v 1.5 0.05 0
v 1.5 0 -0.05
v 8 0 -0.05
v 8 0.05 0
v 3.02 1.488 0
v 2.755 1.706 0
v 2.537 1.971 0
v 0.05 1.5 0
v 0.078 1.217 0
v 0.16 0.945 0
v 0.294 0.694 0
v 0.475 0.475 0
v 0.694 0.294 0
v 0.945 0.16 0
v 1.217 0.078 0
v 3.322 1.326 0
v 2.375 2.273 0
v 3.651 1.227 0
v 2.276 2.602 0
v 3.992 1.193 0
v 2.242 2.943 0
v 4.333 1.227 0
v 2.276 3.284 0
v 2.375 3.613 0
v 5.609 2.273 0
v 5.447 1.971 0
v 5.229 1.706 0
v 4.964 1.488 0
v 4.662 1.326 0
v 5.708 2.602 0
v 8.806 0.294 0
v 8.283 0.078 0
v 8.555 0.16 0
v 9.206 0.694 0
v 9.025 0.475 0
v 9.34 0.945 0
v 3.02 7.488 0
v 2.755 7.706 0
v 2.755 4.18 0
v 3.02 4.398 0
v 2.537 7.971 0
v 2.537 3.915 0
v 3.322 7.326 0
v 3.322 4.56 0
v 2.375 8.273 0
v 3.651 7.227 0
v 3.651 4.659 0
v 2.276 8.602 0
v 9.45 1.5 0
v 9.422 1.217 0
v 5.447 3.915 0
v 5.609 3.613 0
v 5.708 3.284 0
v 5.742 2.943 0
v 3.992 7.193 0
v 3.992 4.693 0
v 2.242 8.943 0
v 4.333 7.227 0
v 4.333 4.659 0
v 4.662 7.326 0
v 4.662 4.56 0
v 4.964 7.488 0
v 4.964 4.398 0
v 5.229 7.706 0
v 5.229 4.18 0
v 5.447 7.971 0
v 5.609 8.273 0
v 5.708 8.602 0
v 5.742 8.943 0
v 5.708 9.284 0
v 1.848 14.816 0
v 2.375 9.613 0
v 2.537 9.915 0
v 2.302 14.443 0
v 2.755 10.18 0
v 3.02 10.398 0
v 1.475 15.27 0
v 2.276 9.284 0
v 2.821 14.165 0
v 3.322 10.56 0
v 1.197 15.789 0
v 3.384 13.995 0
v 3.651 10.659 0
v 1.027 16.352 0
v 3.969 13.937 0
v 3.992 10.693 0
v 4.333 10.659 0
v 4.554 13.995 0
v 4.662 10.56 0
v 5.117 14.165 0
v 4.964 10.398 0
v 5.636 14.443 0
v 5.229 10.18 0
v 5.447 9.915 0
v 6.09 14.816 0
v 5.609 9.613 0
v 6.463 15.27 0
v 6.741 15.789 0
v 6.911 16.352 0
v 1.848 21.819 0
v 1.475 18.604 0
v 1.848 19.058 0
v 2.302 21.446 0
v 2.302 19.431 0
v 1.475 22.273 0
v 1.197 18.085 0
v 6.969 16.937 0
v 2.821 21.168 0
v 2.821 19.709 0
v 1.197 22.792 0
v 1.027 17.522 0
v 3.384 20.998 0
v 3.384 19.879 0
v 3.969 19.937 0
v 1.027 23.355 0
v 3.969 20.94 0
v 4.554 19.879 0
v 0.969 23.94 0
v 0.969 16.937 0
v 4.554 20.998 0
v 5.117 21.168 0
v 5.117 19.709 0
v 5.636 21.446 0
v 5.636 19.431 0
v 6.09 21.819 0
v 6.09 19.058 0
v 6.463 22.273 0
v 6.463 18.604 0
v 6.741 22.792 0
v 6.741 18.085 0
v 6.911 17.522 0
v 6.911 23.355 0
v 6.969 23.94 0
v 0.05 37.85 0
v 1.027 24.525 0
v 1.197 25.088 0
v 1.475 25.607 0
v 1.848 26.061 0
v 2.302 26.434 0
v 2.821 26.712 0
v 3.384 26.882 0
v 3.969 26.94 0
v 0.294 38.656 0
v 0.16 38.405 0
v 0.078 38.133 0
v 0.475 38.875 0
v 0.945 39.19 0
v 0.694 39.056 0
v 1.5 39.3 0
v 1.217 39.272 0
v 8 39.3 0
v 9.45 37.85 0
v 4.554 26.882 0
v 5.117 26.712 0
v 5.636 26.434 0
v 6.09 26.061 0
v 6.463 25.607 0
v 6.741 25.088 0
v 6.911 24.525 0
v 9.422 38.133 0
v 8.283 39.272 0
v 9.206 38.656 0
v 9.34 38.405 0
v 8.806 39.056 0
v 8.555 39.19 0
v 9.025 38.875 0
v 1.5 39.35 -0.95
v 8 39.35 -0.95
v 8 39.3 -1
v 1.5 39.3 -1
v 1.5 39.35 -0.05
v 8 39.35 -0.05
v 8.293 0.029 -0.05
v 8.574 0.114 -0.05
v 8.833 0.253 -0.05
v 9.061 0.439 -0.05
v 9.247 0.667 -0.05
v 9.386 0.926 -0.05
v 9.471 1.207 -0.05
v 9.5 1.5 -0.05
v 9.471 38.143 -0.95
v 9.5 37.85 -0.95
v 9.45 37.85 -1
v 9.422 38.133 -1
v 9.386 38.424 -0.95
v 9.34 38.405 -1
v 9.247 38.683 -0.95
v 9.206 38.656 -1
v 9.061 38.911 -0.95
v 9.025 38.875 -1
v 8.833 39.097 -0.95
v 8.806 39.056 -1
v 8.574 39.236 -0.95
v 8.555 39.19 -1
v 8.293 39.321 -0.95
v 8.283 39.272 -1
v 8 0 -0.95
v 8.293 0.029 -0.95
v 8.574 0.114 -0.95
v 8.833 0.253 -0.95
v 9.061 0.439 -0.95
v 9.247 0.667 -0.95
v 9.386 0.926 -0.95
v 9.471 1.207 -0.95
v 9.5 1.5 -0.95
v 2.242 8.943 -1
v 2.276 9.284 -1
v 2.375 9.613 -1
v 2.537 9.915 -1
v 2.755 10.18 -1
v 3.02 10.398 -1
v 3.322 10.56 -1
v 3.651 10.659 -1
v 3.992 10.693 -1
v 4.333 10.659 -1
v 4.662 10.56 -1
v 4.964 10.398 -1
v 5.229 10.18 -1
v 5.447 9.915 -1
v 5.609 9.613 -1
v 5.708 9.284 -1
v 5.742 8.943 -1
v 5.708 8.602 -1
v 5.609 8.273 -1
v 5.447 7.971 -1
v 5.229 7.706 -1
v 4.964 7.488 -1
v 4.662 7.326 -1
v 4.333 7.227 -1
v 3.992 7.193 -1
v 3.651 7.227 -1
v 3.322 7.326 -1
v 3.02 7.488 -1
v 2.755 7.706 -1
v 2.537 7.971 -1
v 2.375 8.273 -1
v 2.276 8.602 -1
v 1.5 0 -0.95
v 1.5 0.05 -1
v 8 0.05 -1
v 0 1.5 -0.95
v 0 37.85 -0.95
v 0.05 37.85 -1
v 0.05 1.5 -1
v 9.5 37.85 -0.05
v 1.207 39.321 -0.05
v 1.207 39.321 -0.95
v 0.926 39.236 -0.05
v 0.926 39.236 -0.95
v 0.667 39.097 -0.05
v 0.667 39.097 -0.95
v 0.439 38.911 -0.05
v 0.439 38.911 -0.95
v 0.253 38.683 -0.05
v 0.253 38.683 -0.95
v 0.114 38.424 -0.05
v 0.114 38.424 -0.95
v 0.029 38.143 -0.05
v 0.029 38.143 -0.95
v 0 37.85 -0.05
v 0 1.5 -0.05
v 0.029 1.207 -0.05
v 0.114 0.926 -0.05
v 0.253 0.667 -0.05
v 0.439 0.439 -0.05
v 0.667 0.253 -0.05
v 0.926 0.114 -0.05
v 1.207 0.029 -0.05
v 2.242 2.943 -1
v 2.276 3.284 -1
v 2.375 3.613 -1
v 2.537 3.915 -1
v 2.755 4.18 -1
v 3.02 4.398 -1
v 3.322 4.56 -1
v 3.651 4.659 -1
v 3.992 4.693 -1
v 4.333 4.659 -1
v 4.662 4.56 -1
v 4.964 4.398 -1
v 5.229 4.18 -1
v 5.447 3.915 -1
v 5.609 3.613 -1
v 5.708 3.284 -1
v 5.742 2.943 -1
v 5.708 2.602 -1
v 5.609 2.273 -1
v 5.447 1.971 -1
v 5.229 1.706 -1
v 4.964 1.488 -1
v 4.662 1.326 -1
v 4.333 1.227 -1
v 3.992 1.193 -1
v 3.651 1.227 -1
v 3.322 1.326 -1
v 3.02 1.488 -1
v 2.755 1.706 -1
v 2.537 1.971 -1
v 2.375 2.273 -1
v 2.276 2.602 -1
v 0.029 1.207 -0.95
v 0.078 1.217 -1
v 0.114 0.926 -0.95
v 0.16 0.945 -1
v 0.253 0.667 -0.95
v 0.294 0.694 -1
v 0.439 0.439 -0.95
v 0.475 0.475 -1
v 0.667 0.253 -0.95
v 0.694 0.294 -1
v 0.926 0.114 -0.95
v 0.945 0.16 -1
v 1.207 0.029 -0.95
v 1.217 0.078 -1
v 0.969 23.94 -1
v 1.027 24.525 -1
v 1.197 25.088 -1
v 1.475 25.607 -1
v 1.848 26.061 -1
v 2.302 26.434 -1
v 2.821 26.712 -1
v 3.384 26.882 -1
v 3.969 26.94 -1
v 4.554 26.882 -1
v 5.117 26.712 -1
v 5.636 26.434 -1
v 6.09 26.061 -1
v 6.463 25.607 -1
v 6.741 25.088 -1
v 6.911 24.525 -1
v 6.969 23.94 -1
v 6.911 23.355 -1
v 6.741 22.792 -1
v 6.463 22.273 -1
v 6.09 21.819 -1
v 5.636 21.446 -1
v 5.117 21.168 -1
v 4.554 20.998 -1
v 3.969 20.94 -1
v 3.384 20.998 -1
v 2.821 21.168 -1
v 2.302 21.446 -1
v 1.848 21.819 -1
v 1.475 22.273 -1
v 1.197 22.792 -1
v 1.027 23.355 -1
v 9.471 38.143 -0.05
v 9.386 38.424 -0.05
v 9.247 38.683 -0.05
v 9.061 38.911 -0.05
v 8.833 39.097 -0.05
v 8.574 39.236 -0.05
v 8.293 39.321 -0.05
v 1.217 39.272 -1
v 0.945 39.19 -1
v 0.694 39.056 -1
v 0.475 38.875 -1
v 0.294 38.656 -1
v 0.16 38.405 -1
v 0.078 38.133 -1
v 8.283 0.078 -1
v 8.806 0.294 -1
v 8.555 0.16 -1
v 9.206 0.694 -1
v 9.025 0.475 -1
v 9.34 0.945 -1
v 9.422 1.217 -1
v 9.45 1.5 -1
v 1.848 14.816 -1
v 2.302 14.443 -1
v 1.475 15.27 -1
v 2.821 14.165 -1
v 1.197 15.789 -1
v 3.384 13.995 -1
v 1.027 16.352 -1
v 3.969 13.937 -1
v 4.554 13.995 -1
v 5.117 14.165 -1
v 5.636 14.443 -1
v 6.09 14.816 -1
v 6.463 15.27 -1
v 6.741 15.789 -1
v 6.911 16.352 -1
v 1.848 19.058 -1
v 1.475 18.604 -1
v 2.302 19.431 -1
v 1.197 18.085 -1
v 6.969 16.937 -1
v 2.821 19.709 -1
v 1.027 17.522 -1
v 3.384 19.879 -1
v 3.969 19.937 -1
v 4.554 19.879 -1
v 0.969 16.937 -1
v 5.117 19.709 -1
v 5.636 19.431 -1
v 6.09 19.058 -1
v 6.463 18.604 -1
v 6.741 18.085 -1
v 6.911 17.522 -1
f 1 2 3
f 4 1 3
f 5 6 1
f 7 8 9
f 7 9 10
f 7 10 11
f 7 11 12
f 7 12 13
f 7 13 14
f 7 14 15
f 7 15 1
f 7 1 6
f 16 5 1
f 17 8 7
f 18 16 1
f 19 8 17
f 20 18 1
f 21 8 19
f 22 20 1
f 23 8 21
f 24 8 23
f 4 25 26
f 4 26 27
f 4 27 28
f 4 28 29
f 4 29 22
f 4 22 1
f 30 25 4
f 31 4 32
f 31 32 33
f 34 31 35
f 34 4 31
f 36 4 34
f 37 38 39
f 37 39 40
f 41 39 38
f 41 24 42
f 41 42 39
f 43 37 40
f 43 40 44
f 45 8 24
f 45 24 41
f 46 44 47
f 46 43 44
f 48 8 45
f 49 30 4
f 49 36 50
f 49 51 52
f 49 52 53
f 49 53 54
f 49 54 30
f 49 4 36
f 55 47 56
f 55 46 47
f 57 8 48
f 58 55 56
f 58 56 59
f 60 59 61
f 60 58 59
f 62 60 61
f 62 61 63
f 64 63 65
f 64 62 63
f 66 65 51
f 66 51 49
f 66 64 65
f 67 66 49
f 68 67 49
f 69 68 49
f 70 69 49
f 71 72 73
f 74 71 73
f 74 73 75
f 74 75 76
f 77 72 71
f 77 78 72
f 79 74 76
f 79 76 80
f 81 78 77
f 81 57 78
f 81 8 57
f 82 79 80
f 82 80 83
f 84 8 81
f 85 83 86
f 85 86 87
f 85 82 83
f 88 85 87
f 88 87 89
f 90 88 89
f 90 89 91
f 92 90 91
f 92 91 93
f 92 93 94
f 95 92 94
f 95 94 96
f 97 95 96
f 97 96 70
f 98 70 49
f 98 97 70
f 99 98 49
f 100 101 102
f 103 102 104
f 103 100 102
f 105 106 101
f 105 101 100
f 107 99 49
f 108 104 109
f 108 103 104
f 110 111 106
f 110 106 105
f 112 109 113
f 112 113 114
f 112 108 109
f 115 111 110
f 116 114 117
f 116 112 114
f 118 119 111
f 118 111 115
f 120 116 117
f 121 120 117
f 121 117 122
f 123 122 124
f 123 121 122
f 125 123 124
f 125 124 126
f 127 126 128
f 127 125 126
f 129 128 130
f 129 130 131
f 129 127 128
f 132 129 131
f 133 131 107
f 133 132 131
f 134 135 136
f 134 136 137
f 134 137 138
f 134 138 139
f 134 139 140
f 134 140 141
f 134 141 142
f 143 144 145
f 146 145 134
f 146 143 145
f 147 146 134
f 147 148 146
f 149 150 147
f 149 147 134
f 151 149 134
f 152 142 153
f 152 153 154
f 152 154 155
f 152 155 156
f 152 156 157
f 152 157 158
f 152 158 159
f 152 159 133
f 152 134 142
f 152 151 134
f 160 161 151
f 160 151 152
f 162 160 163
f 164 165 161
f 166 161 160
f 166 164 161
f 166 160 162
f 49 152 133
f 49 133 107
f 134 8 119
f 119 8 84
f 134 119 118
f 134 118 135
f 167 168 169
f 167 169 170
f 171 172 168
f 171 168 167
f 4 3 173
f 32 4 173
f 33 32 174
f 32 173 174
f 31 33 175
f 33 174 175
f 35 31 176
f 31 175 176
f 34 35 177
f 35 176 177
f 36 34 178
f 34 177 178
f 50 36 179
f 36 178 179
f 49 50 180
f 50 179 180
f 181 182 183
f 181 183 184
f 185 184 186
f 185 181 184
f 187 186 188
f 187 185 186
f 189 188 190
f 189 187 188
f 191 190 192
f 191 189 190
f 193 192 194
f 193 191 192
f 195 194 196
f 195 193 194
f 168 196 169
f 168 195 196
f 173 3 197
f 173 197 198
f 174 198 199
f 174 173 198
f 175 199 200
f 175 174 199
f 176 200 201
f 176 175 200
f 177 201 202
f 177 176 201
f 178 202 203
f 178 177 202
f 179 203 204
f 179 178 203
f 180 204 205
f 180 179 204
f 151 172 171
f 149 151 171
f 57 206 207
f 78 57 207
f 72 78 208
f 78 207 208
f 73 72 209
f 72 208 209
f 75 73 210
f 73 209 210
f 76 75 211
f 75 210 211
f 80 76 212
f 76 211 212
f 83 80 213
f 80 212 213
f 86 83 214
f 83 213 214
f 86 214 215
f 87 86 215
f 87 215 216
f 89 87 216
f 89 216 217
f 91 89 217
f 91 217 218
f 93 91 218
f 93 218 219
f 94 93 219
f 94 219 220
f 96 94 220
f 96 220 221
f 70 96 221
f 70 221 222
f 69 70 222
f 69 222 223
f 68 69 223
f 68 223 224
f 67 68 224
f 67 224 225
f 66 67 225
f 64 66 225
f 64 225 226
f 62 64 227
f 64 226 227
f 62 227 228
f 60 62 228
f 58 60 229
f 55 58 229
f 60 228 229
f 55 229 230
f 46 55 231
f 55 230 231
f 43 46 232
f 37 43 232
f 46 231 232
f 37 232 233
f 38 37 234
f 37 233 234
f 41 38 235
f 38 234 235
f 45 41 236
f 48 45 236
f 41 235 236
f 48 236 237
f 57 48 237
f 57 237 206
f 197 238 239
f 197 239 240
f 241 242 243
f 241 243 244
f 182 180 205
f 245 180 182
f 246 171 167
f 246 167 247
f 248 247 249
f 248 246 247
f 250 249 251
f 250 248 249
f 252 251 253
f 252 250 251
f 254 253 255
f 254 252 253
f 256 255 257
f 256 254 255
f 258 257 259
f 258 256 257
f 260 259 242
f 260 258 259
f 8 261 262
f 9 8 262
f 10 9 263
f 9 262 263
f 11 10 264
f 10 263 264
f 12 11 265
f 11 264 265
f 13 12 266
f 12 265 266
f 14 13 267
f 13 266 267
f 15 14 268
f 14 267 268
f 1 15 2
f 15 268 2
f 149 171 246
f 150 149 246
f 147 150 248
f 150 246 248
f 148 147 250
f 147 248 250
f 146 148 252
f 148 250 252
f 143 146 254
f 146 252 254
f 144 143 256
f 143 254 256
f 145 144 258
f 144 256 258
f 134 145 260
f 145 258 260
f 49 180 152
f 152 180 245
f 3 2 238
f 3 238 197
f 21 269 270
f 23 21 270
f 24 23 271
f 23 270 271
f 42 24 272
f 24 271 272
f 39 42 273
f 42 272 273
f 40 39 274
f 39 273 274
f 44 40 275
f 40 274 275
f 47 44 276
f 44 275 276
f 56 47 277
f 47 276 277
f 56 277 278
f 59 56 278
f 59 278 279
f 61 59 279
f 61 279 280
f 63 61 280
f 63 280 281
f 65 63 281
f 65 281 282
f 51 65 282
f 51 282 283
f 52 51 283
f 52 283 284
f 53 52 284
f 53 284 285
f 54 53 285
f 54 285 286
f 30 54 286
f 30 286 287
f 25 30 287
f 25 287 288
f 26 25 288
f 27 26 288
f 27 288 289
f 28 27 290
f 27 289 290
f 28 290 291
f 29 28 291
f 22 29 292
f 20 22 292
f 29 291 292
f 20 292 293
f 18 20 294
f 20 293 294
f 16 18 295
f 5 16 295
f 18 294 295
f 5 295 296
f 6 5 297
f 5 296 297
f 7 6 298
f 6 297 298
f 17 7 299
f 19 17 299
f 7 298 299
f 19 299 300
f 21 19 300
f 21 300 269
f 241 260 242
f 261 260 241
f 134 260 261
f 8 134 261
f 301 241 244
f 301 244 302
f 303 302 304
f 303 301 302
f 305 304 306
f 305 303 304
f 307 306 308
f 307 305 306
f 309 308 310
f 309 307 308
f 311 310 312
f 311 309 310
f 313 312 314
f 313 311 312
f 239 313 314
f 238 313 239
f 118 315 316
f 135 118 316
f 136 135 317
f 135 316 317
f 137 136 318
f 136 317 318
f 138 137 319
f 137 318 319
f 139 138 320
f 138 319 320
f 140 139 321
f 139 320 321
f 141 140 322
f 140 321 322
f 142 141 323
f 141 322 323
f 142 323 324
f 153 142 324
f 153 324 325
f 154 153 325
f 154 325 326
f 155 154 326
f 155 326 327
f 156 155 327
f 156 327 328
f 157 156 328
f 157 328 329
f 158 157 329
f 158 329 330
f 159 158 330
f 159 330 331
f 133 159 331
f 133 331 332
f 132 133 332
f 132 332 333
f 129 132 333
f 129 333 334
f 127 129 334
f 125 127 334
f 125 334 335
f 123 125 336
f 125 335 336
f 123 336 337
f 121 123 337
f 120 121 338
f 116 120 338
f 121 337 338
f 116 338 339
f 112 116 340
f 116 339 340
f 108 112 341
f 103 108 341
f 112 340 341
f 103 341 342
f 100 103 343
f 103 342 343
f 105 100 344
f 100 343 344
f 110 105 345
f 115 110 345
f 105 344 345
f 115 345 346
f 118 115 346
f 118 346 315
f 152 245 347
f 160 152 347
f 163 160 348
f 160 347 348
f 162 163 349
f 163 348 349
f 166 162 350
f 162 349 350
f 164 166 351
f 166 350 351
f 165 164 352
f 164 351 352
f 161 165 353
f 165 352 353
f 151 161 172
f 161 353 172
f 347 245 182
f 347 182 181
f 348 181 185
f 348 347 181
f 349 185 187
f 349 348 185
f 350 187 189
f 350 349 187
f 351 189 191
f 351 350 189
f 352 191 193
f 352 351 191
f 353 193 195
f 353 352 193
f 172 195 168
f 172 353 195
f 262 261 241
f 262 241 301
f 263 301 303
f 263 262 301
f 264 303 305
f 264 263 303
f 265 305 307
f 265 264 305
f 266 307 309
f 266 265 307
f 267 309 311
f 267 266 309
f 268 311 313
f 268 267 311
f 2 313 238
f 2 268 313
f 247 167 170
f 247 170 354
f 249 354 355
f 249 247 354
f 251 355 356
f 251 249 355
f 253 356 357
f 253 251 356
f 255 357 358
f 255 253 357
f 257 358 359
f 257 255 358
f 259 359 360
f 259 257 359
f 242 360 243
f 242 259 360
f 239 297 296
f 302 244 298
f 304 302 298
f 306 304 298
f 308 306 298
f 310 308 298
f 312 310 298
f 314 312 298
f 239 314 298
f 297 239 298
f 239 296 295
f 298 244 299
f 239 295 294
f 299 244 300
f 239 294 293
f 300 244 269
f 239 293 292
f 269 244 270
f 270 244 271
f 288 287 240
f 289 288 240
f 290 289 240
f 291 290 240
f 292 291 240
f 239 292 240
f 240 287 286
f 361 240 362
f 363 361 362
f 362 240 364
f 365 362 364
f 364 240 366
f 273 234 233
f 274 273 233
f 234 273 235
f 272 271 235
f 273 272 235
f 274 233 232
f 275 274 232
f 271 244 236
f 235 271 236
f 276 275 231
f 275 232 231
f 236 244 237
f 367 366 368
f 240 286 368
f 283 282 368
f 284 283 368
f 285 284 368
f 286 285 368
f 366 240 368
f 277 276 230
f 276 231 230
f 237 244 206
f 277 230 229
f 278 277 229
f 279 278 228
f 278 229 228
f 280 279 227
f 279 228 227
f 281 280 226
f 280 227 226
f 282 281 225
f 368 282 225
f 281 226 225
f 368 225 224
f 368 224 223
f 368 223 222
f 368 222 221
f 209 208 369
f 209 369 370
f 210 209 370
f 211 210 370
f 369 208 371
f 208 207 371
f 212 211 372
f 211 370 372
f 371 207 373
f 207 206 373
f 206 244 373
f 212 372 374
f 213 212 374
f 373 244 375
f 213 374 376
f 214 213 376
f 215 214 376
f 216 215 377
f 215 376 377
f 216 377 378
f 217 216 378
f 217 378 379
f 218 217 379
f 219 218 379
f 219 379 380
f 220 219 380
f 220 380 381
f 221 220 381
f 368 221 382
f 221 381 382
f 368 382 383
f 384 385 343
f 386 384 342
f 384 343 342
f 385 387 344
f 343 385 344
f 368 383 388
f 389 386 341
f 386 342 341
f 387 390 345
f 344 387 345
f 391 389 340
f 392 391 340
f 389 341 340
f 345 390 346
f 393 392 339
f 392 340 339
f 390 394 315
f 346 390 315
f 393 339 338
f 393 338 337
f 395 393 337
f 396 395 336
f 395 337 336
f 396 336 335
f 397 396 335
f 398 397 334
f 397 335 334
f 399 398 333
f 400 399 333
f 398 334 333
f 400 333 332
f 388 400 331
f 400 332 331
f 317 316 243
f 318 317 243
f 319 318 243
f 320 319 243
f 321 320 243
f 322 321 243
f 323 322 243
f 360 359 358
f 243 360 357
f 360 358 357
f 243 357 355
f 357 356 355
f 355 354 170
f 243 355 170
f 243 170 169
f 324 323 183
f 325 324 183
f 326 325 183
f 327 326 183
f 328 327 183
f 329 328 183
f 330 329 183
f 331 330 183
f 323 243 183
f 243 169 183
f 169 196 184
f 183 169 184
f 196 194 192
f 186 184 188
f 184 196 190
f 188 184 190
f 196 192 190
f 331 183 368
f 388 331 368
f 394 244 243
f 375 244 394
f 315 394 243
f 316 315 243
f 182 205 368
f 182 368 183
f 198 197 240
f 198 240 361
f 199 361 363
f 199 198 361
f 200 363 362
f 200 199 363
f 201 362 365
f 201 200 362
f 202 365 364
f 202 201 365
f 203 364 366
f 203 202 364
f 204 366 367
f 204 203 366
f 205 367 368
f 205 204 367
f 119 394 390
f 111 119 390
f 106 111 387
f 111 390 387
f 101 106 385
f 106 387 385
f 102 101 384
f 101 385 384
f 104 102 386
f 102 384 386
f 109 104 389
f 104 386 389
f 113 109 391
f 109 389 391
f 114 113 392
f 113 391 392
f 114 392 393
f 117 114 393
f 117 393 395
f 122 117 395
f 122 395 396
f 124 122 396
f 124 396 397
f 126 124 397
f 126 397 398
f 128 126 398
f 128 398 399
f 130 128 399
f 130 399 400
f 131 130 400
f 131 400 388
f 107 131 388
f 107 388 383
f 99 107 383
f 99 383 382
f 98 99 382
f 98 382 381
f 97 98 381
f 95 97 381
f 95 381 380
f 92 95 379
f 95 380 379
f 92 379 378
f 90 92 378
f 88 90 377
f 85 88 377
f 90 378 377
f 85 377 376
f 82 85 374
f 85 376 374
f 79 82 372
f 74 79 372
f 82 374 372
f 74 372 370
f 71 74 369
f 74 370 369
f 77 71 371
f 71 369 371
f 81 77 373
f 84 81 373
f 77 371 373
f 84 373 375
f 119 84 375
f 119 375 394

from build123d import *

# Parameters (mm, degrees)
F1_DEPTH = 1
F3_D     = 3.5
F5_D     = 6
F6_SIZE  = 0.05


with BuildPart() as f1:
    # F0 (on Top) → F1 (new body)
    with BuildSketch(Plane.XY):
        with BuildLine():
            Line((0, 37.85), (0, 1.5))
            ThreePointArc((0, 1.5), (0.4393398282, 0.4393398282), (1.5, 0))
            Line((1.5, 0), (8, 0))
            ThreePointArc((8, 0), (9.0606601718, 0.4393398282), (9.5, 1.5))
            Line((9.5, 1.5), (9.5, 37.85))
            ThreePointArc((9.5, 37.85), (9.0606601718, 38.9106601718), (8, 39.35))
            Line((8, 39.35), (1.5, 39.35))
            ThreePointArc((1.5, 39.35), (0.4393398282, 38.9106601718), (0, 37.85))
        make_face()
    extrude(amount=-F1_DEPTH)

    # F3 (through all)
    with Locations(Plane.XY):
        with Locations((3.992, 8.943), (3.992, 2.943)):
            Hole(F3_D / 2)

    # F5 (through all)
    with Locations(Plane.XY):
        with Locations((3.969, 23.94), (3.969, 16.937)):
            Hole(F5_D / 2)

    # F6
    f6_edges = [f1.edges().sort_by_distance(p)[0] for p in [
        (9.5, 19.675, 0),
        (0, 19.675, 0),
        (4.75, 0, -1),
        (4.75, 0, 0),
        (9.5, 19.675, -1),
        (4.75, 39.35, 0),
        (0, 19.675, -1),
        (4.75, 39.35, -1),
        (0.43934, 38.91066, 0),
        (0.43934, 38.91066, -1),
        (0.43934, 0.43934, 0),
        (0.43934, 0.43934, -1),
        (9.06066, 38.91066, 0),
        (9.06066, 0.43934, 0),
        (9.06066, 38.91066, -1),
        (9.06066, 0.43934, -1),
    ]]
    chamfer(f6_edges, length=F6_SIZE)


solid = f1.part
